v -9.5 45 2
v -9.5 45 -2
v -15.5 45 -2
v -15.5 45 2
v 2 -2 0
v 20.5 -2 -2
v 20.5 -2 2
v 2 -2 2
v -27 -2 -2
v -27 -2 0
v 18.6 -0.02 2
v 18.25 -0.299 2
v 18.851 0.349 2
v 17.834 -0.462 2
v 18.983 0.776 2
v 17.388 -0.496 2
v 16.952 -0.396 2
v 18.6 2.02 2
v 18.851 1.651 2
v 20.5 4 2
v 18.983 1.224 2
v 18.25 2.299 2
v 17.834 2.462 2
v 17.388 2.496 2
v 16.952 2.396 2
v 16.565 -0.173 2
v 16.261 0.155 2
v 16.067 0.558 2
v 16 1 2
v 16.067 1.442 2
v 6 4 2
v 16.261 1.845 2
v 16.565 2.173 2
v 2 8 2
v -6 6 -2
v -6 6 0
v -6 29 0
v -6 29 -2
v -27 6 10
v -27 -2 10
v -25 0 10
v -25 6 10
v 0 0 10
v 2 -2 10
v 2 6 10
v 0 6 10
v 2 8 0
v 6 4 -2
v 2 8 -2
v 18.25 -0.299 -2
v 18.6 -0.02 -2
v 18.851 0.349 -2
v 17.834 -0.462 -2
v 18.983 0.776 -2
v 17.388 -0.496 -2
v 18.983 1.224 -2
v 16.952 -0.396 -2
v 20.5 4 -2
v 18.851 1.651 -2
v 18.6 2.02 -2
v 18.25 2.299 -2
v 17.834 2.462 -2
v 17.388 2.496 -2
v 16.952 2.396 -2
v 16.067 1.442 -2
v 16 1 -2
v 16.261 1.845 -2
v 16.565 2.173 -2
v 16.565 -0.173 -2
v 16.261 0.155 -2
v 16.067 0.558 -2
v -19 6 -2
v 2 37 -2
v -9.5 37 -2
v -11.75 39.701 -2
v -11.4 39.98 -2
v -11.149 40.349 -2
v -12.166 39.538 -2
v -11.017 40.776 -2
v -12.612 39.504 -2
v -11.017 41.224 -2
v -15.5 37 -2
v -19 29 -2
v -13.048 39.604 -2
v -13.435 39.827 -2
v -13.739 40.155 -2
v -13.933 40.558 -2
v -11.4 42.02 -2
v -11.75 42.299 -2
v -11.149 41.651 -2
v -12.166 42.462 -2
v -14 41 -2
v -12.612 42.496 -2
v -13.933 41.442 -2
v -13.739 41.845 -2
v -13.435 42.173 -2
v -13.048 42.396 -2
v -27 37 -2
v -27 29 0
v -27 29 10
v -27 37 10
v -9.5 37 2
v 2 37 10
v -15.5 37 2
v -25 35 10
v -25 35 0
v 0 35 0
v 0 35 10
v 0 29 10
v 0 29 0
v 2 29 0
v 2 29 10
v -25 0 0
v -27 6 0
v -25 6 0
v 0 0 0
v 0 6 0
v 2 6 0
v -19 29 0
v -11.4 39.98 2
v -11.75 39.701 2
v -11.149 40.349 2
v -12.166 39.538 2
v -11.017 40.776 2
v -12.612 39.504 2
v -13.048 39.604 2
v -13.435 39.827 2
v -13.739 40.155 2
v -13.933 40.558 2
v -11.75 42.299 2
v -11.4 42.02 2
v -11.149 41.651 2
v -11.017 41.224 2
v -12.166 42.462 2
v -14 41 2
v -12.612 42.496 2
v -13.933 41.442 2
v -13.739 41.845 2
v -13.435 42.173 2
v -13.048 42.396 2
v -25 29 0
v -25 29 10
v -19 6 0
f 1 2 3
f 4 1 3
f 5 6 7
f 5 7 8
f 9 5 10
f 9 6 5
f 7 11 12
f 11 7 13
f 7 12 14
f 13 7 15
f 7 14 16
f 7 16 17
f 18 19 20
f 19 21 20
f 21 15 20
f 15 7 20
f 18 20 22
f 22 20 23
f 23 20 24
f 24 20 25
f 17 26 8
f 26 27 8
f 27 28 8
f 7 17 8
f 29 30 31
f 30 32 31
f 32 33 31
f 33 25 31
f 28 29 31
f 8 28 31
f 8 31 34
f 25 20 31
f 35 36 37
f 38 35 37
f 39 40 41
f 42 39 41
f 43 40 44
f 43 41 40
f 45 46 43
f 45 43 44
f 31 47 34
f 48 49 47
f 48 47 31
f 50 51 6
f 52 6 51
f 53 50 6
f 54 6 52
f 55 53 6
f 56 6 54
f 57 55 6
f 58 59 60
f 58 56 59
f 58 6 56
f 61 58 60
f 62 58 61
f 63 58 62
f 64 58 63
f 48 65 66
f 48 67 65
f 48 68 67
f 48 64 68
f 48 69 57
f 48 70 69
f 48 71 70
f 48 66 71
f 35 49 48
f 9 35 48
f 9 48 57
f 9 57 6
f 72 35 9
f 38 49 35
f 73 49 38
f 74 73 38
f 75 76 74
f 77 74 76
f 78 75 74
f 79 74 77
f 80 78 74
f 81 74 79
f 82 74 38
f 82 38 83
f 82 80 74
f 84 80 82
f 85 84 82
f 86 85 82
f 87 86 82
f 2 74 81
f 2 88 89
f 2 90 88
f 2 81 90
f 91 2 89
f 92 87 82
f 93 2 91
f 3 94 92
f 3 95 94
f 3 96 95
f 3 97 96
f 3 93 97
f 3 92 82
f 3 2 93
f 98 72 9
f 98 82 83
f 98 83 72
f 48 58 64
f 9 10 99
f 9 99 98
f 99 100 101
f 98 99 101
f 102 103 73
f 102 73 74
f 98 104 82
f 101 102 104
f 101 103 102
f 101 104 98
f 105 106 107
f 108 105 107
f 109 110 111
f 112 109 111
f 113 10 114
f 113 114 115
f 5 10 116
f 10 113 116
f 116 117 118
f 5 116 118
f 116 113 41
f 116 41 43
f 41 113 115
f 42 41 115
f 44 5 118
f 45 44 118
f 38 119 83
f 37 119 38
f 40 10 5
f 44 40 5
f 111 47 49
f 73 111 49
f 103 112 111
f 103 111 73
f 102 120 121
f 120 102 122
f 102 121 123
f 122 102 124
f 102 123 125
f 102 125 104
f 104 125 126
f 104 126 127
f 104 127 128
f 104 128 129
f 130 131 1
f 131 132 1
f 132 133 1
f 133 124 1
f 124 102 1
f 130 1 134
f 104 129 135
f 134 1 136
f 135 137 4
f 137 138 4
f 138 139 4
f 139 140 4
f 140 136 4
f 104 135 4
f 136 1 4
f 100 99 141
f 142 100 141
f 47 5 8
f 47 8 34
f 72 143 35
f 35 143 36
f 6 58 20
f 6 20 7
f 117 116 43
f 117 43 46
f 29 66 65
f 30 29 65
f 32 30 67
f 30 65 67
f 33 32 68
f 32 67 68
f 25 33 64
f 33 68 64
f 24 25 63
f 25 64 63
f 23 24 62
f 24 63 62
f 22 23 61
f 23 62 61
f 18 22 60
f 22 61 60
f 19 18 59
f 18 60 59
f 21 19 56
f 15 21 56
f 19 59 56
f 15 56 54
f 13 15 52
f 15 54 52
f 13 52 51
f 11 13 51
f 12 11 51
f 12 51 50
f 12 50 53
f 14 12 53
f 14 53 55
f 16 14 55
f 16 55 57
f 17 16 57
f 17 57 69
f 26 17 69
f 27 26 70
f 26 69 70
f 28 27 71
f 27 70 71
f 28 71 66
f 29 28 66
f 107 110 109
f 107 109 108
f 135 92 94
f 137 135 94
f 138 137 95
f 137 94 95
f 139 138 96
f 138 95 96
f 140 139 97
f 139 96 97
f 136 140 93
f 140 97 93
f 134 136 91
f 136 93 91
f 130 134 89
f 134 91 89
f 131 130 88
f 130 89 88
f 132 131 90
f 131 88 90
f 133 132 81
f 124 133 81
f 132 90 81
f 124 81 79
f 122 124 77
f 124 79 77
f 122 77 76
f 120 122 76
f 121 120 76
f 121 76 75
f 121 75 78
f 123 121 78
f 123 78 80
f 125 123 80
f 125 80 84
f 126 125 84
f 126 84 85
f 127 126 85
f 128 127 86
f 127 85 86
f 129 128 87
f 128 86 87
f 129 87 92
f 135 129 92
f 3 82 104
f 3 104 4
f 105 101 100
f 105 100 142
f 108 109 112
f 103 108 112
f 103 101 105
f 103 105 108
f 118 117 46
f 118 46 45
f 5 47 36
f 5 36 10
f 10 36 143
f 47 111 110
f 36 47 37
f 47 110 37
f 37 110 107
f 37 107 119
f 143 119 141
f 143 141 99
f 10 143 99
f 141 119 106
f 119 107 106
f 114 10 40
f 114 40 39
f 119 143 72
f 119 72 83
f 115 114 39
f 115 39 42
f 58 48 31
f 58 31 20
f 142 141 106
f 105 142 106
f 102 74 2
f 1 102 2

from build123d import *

# Parameters (mm, degrees)
SKETCH_1_W          = 29
SKETCH_1_H          = 39
SKETCH_1_W_2        = 25
SKETCH_1_H_2        = 35
EXTRUDE_1_DEPTH     = 10
SKETCH_4_W          = 2
SKETCH_4_H          = 23
CUT_EXTRUDE_2_DEPTH = 10
SKETCH_5_W          = 29
SKETCH_5_H          = 39
EXTRUDE_1_2_DEPTH   = 2
SKETCH_7_W          = 6
SKETCH_7_H          = 8
SKETCH_7_R          = 1.5
EXTRUDE_2_DEPTH     = 4
SKETCH_9_W          = 13
SKETCH_9_H          = 23
CUT_EXTRUDE_3_DEPTH = 4


with BuildPart() as part:
    # 草图1 → Extrude 1 (new body)
    with BuildSketch(Plane.XY):
        with Locations((-12.5, 17.5)):
            Rectangle(SKETCH_1_W, SKETCH_1_H)
        with Locations((-12.5, 17.5)):
            Rectangle(SKETCH_1_W_2, SKETCH_1_H_2, mode=Mode.SUBTRACT)
    extrude(amount=EXTRUDE_1_DEPTH)

    # 草图4 → 切除-拉伸2 (cut)
    with BuildSketch(Plane.XY.offset(10)):
        with Locations((1, 17.5)):
            Rectangle(SKETCH_4_W, SKETCH_4_H)
        with Locations((-26, 17.5)):
            Rectangle(SKETCH_4_W, SKETCH_4_H)
    extrude(amount=-CUT_EXTRUDE_2_DEPTH, mode=Mode.SUBTRACT)


with BuildPart() as cut_extrude_2_piece_1:
    # of the separate pieces the step leaves, piece 1, a body of its own (cut_extrude_2_pieces)
    add(part.part.solids().sort_by_distance((-27, 37, 0))[0])

    # 草图5 → Extrude 1 2 (add)
    with BuildSketch(Plane(origin=(0, 0, 0), x_dir=(-1, 0, 0), z_dir=(0, 0, -1))):
        with Locations((12.5, 17.5)):
            Rectangle(SKETCH_5_W, SKETCH_5_H)
    extrude(amount=EXTRUDE_1_2_DEPTH)

    # 草图7 → 凸台-拉伸2 (add)
    # profile 1 of 2: a face of its own
    with BuildSketch(Plane(origin=(0, 0, -2), x_dir=(-1, 0, 0), z_dir=(0, 0, -1))):
        with Locations((12.5, 41)):
            Rectangle(SKETCH_7_W, SKETCH_7_H)
        with Locations((12.5, 41)):
            Circle(SKETCH_7_R, mode=Mode.SUBTRACT)
    # profile 2 of 2: a face of its own
    with BuildSketch(Plane(origin=(0, 0, -2), x_dir=(-1, 0, 0), z_dir=(0, 0, -1))):
        Polygon((-2, 4), (-2, 8), (-6, 4), (-20.5, 4), (-20.5, -2), (-2, -2), align=None)
        with Locations((-17.5, 1)):
            Circle(SKETCH_7_R, mode=Mode.SUBTRACT)
    extrude(amount=-EXTRUDE_2_DEPTH)

    # 草图9 → 切除-拉伸3 (cut)
    with BuildSketch(Plane.XY):
        with Locations((-12.5, 17.5)):
            Rectangle(SKETCH_9_W, SKETCH_9_H)
    extrude(amount=-CUT_EXTRUDE_3_DEPTH, mode=Mode.SUBTRACT)


with BuildPart() as cut_extrude_2_piece_2:
    # of the separate pieces the step leaves, piece 2, a body of its own (cut_extrude_2_pieces)
    add(part.part.solids().sort_by_distance((-27, -2, 0))[0])


solid = Compound([cut_extrude_2_piece_1.part, cut_extrude_2_piece_2.part])
